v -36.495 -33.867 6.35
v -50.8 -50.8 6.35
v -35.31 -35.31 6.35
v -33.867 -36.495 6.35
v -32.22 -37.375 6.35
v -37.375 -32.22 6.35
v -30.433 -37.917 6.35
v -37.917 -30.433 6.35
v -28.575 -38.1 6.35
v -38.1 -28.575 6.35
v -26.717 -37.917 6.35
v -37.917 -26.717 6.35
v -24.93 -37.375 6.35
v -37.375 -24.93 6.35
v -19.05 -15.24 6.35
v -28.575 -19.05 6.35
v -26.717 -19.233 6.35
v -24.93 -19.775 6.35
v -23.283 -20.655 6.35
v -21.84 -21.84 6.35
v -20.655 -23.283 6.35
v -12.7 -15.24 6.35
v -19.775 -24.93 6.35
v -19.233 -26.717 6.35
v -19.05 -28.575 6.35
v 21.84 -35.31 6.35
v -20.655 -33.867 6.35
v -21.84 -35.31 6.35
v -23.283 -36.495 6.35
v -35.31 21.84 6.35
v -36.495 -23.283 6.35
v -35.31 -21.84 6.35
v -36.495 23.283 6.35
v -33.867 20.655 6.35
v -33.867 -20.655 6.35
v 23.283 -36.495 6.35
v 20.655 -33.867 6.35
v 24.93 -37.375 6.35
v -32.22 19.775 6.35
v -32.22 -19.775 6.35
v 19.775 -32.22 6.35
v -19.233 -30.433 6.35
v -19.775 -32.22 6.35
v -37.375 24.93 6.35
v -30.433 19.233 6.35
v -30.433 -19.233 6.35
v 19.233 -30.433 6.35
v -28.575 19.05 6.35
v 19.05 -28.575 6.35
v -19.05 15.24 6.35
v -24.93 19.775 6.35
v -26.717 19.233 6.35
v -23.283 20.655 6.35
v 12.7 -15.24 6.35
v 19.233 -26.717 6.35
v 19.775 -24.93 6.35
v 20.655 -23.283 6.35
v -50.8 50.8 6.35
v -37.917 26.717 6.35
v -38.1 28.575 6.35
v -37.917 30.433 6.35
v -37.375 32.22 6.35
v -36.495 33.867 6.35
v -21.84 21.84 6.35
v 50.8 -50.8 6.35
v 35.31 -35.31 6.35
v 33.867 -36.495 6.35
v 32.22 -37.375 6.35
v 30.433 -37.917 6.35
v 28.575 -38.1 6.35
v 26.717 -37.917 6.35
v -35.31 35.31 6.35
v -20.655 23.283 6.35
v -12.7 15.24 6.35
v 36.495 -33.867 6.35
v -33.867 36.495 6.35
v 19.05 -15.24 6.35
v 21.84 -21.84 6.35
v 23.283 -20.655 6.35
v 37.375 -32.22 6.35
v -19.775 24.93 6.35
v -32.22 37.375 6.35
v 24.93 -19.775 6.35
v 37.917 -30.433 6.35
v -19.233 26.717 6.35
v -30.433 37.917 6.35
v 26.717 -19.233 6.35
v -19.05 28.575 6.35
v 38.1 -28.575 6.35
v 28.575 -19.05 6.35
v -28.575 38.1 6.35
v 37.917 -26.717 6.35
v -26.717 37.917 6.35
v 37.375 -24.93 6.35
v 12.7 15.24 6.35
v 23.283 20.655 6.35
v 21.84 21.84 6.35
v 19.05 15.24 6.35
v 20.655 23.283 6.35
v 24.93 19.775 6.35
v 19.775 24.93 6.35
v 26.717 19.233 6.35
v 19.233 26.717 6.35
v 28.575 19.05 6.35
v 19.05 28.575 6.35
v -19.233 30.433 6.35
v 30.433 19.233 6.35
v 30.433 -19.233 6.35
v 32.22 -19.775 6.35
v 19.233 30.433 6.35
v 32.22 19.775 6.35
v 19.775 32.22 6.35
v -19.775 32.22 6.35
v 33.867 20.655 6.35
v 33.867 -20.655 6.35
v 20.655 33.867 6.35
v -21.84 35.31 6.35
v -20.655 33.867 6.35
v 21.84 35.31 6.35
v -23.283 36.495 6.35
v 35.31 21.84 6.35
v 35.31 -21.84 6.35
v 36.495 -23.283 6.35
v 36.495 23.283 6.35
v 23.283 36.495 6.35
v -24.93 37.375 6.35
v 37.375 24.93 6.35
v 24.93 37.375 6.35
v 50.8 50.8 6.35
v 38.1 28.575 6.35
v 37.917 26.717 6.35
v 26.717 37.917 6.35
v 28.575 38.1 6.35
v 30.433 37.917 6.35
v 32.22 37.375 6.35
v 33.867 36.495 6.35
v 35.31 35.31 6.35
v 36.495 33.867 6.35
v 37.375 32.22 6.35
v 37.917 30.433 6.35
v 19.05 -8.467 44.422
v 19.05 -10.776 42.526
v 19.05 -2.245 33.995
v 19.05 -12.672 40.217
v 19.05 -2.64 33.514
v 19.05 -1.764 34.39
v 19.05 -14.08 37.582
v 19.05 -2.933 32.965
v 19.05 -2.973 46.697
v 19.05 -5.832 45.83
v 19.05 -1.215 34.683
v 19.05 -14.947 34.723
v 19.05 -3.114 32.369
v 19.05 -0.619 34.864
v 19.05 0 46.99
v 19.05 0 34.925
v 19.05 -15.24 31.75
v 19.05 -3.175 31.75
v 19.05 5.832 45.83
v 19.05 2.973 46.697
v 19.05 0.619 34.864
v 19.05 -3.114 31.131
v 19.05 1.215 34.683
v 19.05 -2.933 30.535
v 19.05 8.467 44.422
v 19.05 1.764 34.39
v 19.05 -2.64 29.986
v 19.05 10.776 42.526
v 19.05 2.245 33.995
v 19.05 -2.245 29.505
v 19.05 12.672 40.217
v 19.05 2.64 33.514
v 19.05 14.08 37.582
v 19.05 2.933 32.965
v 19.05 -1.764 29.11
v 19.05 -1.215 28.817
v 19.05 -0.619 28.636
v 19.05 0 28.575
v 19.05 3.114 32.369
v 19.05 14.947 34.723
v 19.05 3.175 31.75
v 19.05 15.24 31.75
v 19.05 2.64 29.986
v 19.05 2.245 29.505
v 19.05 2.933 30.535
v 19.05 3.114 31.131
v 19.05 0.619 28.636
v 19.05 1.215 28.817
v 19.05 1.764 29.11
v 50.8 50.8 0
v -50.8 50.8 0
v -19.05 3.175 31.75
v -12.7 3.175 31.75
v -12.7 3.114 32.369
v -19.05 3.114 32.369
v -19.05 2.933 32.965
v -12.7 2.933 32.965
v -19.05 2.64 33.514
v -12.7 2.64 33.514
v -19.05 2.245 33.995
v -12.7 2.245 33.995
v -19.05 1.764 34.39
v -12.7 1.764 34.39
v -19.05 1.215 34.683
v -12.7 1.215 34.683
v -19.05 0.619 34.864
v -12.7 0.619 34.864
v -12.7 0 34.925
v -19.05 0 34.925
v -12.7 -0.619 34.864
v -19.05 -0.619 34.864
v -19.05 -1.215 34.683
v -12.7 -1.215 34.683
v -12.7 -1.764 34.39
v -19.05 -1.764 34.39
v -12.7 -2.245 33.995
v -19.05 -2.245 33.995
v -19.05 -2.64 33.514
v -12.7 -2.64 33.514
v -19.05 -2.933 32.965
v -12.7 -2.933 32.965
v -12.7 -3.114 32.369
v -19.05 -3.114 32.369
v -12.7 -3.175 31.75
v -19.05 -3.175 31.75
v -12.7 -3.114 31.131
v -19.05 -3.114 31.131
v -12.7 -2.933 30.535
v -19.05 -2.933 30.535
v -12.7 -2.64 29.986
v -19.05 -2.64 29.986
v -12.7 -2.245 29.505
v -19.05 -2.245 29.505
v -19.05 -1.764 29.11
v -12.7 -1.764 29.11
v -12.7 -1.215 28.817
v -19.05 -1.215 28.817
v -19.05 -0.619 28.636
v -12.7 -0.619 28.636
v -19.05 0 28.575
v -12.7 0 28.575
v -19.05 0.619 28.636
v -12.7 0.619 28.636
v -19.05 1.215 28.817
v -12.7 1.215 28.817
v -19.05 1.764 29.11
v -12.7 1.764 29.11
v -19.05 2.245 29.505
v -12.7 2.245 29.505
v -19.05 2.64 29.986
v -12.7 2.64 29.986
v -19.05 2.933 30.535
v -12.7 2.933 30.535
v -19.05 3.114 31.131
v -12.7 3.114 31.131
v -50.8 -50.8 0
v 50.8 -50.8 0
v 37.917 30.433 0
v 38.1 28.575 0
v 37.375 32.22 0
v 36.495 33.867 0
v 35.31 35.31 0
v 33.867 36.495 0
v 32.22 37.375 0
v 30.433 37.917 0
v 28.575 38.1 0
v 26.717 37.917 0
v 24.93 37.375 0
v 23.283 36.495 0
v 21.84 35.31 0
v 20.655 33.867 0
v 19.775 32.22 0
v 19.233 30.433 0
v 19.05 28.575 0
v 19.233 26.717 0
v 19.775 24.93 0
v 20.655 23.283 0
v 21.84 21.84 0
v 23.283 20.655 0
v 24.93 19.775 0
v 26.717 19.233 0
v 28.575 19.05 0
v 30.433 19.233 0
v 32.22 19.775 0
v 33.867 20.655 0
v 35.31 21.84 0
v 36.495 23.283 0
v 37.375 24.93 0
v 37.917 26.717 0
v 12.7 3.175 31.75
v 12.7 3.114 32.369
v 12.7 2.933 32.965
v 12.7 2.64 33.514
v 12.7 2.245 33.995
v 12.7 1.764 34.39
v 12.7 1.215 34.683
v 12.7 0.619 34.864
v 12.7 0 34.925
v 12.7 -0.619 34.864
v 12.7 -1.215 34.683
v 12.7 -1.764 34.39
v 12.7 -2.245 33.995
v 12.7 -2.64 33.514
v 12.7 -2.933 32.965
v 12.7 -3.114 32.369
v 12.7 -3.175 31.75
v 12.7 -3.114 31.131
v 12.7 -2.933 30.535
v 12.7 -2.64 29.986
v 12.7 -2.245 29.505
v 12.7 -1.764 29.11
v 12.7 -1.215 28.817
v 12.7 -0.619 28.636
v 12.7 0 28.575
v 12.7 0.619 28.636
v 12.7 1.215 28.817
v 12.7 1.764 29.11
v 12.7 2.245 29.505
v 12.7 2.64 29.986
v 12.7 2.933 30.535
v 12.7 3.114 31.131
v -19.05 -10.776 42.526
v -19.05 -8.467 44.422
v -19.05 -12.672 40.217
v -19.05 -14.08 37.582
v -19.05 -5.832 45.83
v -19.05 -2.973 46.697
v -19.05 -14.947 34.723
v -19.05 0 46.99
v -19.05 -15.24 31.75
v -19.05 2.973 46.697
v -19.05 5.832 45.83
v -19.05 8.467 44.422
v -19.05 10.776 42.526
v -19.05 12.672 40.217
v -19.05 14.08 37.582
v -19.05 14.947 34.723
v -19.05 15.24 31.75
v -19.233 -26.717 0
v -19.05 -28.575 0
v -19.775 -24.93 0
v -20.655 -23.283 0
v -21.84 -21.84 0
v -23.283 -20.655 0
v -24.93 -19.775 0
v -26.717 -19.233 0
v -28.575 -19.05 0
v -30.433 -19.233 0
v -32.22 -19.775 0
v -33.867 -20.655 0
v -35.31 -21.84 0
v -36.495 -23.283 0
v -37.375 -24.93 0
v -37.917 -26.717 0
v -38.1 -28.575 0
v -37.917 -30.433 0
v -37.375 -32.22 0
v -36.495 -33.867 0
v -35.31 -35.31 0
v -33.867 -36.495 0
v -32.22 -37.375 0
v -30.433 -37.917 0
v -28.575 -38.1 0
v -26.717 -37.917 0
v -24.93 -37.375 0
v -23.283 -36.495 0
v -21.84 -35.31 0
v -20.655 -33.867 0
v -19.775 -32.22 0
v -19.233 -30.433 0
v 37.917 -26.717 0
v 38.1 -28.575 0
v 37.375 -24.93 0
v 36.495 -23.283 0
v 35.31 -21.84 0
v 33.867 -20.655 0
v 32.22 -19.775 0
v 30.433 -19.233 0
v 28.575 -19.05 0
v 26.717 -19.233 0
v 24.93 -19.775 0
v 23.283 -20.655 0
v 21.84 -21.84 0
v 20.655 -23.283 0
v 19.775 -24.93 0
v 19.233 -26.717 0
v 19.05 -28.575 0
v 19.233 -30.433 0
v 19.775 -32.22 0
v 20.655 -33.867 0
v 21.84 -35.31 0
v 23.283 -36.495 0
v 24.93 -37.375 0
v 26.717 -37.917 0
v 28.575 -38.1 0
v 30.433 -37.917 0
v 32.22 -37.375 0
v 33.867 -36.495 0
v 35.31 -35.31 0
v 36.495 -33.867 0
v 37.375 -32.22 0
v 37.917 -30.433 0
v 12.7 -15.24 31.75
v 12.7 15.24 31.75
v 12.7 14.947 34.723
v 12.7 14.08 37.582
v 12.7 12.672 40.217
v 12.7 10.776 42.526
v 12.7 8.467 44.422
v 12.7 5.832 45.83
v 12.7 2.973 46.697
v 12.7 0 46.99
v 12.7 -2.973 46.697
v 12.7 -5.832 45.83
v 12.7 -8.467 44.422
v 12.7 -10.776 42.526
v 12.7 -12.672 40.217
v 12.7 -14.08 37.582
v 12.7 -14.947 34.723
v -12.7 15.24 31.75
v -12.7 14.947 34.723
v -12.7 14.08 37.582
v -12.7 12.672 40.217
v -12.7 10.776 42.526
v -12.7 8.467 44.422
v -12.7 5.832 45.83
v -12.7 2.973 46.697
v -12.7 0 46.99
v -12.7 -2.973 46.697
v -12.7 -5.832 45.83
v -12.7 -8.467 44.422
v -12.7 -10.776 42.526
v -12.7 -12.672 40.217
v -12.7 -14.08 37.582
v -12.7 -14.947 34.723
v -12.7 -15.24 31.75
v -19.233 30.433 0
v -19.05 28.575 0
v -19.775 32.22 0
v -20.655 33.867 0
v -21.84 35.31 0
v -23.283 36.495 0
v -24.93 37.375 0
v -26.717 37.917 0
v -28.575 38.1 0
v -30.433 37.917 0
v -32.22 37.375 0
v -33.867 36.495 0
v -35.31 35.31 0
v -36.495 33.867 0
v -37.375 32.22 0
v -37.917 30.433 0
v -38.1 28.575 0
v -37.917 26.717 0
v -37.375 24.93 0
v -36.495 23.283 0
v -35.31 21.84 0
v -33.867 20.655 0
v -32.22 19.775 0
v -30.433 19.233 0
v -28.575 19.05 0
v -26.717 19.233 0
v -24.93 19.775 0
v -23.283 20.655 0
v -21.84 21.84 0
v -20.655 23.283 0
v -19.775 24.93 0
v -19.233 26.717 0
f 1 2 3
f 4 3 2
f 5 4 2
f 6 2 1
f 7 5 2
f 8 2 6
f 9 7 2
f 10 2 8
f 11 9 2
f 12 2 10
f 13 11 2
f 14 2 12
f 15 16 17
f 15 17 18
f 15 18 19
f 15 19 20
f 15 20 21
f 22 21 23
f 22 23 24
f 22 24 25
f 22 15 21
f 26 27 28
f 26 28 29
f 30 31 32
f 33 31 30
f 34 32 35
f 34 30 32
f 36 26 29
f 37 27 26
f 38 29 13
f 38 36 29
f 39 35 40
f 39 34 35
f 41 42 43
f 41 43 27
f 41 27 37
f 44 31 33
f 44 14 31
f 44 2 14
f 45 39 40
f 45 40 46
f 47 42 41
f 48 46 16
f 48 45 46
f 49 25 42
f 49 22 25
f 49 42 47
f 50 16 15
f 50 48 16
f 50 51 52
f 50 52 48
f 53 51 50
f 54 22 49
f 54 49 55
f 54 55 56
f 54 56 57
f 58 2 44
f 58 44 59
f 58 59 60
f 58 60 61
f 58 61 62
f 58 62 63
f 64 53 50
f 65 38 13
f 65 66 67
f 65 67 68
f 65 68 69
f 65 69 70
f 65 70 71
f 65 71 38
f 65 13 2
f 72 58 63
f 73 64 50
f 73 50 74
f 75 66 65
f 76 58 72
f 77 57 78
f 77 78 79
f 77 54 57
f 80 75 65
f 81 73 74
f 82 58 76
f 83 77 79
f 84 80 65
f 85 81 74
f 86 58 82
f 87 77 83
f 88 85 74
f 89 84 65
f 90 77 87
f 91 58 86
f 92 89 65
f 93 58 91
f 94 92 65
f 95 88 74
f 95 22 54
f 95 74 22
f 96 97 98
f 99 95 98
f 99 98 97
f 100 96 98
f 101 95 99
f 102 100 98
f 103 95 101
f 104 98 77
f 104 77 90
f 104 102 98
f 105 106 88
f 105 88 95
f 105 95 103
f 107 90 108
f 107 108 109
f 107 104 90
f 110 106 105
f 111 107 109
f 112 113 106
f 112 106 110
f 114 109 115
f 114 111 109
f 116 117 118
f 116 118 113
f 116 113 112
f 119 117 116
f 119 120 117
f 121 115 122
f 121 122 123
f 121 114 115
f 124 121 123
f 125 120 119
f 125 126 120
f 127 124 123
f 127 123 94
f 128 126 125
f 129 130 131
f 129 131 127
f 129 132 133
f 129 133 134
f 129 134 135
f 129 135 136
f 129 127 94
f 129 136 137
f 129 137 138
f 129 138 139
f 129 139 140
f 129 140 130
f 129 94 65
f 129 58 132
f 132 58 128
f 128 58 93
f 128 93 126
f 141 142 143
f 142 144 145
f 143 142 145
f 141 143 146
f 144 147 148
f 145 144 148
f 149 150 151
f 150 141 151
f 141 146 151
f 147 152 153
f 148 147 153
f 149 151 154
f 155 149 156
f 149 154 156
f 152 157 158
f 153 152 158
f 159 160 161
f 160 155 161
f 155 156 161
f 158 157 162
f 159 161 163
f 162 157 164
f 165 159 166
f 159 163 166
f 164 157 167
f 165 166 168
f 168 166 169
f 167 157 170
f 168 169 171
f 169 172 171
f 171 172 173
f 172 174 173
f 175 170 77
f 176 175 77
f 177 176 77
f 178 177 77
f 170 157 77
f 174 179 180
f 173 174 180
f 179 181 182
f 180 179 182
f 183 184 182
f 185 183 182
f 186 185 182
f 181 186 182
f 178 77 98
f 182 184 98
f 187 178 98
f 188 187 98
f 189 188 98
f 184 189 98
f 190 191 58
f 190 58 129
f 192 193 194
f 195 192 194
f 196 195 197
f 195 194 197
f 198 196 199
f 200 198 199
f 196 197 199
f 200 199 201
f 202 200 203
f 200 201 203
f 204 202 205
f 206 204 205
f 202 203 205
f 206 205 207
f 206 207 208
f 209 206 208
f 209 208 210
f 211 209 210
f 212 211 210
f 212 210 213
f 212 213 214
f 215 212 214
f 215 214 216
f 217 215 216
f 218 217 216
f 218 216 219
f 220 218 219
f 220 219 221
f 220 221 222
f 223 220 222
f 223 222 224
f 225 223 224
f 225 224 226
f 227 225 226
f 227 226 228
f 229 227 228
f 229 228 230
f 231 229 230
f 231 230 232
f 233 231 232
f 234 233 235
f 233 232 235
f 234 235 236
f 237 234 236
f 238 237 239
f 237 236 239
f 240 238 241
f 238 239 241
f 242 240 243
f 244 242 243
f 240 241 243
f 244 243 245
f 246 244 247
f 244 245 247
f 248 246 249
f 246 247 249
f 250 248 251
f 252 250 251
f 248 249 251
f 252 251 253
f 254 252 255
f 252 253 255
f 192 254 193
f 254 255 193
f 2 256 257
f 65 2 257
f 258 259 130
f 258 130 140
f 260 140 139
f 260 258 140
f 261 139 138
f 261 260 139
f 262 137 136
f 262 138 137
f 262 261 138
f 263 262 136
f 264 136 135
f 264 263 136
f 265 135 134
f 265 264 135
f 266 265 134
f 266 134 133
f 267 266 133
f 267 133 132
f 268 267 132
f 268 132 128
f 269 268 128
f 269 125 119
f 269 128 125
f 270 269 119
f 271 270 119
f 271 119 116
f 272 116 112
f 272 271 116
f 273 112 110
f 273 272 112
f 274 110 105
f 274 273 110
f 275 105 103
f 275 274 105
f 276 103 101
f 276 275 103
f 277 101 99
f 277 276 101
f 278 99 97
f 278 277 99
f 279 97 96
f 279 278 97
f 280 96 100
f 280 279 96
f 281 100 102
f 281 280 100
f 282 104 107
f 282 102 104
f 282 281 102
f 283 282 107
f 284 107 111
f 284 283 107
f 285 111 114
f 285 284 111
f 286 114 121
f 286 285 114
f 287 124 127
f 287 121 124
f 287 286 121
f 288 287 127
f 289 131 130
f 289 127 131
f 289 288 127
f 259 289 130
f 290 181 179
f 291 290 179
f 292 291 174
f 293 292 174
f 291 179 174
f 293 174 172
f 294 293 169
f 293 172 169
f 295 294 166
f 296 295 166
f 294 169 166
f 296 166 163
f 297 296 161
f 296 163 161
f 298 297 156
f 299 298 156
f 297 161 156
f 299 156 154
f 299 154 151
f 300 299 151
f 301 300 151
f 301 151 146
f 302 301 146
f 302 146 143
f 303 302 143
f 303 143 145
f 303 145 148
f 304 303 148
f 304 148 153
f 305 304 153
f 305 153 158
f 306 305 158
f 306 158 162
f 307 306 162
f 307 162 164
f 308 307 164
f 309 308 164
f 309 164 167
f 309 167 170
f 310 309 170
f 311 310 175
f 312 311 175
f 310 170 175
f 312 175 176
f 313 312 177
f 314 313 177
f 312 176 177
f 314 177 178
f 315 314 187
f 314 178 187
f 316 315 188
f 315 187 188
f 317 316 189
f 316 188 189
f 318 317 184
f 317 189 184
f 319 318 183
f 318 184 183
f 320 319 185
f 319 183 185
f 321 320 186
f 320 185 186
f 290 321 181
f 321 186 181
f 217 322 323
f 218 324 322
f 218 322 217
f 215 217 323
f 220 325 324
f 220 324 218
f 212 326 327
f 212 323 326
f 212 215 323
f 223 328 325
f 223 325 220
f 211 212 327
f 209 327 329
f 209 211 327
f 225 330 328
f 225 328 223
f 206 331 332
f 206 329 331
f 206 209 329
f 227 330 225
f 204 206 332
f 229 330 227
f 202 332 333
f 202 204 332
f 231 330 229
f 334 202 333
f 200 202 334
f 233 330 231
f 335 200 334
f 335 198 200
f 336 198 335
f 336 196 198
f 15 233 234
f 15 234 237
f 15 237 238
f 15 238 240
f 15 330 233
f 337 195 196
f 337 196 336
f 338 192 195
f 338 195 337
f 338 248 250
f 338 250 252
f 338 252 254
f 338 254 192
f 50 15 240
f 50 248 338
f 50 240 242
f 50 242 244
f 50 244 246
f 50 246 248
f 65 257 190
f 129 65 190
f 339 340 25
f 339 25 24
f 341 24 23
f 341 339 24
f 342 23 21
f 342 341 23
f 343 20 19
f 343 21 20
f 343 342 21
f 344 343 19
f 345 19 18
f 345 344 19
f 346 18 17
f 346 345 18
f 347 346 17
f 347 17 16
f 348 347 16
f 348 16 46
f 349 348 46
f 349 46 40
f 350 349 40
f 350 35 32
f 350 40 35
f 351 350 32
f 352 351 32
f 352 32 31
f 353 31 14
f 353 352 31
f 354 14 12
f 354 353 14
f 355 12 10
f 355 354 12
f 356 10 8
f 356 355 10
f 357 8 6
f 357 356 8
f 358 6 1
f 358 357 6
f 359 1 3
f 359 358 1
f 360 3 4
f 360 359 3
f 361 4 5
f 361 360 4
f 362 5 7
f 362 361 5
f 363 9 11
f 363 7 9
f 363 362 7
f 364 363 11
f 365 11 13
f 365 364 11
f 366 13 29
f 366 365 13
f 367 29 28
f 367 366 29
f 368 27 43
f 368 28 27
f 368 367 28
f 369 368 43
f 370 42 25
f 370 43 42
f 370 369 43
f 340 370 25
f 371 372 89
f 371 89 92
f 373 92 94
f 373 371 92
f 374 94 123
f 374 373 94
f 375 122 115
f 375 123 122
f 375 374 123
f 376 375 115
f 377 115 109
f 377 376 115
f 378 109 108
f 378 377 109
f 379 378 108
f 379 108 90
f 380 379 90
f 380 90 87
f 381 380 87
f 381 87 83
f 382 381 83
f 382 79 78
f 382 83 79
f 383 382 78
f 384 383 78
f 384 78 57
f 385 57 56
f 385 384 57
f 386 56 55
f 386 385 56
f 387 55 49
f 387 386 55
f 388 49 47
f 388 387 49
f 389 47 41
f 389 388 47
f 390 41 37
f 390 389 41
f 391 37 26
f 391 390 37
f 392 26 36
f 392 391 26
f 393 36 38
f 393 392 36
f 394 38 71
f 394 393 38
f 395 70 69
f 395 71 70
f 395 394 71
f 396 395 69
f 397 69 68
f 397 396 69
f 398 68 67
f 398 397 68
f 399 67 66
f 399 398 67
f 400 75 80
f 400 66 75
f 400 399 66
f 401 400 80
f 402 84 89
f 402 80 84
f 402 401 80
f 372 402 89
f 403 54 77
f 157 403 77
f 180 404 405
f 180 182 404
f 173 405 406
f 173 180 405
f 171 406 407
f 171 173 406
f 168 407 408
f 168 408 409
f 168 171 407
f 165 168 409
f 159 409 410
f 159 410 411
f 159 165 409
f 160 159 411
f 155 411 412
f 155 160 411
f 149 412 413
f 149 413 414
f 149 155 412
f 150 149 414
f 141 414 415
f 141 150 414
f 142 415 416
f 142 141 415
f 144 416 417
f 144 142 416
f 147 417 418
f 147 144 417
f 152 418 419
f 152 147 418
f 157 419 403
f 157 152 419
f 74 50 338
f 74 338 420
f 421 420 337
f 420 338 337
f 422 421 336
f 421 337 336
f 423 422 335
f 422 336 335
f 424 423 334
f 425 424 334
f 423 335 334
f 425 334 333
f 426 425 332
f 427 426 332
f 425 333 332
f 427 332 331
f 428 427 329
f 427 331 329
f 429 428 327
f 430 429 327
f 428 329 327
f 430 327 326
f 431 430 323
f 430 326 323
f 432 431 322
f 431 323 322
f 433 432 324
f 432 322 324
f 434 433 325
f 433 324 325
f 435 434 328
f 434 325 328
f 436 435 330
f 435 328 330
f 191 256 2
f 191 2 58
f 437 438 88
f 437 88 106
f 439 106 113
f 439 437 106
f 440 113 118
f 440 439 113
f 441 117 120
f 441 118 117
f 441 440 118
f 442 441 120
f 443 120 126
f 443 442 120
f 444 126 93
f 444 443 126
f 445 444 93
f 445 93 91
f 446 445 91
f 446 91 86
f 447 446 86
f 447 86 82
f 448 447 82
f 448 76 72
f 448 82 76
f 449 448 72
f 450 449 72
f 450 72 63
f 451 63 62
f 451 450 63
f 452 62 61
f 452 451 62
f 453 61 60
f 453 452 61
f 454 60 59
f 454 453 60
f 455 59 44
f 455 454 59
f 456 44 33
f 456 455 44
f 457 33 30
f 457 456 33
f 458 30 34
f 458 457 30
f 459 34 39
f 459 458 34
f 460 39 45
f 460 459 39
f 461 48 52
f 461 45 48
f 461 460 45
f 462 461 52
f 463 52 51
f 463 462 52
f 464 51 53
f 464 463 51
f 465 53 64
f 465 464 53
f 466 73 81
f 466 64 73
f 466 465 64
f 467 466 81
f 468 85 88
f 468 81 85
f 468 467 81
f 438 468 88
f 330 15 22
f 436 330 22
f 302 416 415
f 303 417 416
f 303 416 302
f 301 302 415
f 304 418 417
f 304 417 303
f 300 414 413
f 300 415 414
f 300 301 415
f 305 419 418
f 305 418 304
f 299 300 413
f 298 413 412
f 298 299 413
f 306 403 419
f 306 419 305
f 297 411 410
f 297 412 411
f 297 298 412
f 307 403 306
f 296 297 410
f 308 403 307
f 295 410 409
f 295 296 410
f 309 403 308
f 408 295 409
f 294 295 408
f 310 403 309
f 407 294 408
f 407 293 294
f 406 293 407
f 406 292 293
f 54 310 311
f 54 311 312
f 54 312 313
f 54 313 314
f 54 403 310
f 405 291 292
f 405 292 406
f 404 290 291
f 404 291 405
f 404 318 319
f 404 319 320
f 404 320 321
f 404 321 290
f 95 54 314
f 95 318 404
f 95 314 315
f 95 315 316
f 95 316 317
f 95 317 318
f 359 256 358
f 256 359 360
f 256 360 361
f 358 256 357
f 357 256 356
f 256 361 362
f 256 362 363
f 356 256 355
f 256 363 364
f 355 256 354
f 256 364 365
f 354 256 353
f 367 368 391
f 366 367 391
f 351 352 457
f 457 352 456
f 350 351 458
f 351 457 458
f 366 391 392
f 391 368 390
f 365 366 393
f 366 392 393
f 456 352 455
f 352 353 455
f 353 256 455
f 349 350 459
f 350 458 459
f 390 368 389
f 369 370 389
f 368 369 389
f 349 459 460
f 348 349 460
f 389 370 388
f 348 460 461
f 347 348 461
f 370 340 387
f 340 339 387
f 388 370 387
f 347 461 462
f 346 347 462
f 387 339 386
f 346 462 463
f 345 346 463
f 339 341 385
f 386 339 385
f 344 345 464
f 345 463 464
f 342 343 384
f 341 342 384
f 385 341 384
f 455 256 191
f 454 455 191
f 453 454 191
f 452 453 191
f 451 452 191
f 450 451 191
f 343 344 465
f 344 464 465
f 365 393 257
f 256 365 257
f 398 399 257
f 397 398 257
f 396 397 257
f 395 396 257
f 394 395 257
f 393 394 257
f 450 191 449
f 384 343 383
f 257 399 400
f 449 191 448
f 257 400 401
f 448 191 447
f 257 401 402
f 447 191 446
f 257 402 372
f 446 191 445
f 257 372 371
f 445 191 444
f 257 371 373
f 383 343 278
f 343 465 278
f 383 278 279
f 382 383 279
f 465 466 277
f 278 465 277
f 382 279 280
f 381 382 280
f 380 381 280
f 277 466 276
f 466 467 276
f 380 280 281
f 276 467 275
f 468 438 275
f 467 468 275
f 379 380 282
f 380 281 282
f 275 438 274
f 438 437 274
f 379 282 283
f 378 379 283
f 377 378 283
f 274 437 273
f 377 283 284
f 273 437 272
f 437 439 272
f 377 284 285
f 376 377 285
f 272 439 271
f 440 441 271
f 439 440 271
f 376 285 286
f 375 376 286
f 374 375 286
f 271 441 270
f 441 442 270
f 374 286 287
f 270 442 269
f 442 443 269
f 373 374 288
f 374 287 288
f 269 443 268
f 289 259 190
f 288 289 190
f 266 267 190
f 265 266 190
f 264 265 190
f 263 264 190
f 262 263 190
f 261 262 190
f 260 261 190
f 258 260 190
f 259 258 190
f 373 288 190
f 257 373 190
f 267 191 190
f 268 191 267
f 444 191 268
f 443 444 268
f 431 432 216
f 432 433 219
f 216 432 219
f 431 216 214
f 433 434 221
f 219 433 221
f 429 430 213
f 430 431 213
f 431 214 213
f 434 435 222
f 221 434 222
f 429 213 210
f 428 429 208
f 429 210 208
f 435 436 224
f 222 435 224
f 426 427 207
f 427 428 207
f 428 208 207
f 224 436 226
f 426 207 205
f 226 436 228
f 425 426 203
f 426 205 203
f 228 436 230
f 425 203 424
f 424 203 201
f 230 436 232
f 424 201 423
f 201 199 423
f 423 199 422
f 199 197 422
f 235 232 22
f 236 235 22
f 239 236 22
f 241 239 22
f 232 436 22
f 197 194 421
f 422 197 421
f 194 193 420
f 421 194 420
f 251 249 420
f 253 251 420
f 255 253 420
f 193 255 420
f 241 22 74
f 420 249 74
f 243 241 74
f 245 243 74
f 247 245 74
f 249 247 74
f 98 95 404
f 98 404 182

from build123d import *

# Parameters (mm, degrees)
F0_W     = 101.6
F0_H     = 101.6
F0_R     = 9.525
F1_DEPTH = 6.35
F2_W     = 6.35
F2_H     = 30.48
F3_DEPTH = 25.4
F4_W     = 6.35
F4_H     = 15.24
F7_R     = 3.175
F8_DEPTH = 44.45


with BuildPart() as f1:
    # F0 (on Top) → F1 (new body)
    with BuildSketch(Plane.XY):
        Rectangle(F0_W, F0_H)
        with Locations((-28.575, -28.575)):
            Circle(F0_R, mode=Mode.SUBTRACT)
        with Locations((28.575, -28.575)):
            Circle(F0_R, mode=Mode.SUBTRACT)
        with Locations((-28.575, 28.575)):
            Circle(F0_R, mode=Mode.SUBTRACT)
        with Locations((28.575, 28.575)):
            Circle(F0_R, mode=Mode.SUBTRACT)
    extrude(amount=F1_DEPTH)

    # F2 (on face) → F3 (join)
    with BuildSketch(Plane.XY.offset(6.35)):
        with Locations((15.875, 0)):
            Rectangle(F2_W, F2_H)
        with Locations((-15.875, 0)):
            Rectangle(F2_W, F2_H)
    extrude(amount=F3_DEPTH)

    # F4 (on face) → F5 (revolve)
    with BuildSketch(Plane.XY.offset(31.75)):
        with Locations((15.875, -7.62)):
            Rectangle(F4_W, F4_H)
    revolve(axis=Axis((15.875, 0, 31.75), (1, 0, 0)))

    # F6: F1 across plane


with BuildPart() as f1_1:
    add(f1.part)
    add(f1.part.mirror(Plane.YZ))

    # F7 (on face) → F8 (cut)
    with BuildSketch(Plane.YZ.offset(19.05)):
        with Locations((0, 31.75)):
            Circle(F7_R)
    extrude(amount=-F8_DEPTH, mode=Mode.SUBTRACT)


solid = f1_1.part
